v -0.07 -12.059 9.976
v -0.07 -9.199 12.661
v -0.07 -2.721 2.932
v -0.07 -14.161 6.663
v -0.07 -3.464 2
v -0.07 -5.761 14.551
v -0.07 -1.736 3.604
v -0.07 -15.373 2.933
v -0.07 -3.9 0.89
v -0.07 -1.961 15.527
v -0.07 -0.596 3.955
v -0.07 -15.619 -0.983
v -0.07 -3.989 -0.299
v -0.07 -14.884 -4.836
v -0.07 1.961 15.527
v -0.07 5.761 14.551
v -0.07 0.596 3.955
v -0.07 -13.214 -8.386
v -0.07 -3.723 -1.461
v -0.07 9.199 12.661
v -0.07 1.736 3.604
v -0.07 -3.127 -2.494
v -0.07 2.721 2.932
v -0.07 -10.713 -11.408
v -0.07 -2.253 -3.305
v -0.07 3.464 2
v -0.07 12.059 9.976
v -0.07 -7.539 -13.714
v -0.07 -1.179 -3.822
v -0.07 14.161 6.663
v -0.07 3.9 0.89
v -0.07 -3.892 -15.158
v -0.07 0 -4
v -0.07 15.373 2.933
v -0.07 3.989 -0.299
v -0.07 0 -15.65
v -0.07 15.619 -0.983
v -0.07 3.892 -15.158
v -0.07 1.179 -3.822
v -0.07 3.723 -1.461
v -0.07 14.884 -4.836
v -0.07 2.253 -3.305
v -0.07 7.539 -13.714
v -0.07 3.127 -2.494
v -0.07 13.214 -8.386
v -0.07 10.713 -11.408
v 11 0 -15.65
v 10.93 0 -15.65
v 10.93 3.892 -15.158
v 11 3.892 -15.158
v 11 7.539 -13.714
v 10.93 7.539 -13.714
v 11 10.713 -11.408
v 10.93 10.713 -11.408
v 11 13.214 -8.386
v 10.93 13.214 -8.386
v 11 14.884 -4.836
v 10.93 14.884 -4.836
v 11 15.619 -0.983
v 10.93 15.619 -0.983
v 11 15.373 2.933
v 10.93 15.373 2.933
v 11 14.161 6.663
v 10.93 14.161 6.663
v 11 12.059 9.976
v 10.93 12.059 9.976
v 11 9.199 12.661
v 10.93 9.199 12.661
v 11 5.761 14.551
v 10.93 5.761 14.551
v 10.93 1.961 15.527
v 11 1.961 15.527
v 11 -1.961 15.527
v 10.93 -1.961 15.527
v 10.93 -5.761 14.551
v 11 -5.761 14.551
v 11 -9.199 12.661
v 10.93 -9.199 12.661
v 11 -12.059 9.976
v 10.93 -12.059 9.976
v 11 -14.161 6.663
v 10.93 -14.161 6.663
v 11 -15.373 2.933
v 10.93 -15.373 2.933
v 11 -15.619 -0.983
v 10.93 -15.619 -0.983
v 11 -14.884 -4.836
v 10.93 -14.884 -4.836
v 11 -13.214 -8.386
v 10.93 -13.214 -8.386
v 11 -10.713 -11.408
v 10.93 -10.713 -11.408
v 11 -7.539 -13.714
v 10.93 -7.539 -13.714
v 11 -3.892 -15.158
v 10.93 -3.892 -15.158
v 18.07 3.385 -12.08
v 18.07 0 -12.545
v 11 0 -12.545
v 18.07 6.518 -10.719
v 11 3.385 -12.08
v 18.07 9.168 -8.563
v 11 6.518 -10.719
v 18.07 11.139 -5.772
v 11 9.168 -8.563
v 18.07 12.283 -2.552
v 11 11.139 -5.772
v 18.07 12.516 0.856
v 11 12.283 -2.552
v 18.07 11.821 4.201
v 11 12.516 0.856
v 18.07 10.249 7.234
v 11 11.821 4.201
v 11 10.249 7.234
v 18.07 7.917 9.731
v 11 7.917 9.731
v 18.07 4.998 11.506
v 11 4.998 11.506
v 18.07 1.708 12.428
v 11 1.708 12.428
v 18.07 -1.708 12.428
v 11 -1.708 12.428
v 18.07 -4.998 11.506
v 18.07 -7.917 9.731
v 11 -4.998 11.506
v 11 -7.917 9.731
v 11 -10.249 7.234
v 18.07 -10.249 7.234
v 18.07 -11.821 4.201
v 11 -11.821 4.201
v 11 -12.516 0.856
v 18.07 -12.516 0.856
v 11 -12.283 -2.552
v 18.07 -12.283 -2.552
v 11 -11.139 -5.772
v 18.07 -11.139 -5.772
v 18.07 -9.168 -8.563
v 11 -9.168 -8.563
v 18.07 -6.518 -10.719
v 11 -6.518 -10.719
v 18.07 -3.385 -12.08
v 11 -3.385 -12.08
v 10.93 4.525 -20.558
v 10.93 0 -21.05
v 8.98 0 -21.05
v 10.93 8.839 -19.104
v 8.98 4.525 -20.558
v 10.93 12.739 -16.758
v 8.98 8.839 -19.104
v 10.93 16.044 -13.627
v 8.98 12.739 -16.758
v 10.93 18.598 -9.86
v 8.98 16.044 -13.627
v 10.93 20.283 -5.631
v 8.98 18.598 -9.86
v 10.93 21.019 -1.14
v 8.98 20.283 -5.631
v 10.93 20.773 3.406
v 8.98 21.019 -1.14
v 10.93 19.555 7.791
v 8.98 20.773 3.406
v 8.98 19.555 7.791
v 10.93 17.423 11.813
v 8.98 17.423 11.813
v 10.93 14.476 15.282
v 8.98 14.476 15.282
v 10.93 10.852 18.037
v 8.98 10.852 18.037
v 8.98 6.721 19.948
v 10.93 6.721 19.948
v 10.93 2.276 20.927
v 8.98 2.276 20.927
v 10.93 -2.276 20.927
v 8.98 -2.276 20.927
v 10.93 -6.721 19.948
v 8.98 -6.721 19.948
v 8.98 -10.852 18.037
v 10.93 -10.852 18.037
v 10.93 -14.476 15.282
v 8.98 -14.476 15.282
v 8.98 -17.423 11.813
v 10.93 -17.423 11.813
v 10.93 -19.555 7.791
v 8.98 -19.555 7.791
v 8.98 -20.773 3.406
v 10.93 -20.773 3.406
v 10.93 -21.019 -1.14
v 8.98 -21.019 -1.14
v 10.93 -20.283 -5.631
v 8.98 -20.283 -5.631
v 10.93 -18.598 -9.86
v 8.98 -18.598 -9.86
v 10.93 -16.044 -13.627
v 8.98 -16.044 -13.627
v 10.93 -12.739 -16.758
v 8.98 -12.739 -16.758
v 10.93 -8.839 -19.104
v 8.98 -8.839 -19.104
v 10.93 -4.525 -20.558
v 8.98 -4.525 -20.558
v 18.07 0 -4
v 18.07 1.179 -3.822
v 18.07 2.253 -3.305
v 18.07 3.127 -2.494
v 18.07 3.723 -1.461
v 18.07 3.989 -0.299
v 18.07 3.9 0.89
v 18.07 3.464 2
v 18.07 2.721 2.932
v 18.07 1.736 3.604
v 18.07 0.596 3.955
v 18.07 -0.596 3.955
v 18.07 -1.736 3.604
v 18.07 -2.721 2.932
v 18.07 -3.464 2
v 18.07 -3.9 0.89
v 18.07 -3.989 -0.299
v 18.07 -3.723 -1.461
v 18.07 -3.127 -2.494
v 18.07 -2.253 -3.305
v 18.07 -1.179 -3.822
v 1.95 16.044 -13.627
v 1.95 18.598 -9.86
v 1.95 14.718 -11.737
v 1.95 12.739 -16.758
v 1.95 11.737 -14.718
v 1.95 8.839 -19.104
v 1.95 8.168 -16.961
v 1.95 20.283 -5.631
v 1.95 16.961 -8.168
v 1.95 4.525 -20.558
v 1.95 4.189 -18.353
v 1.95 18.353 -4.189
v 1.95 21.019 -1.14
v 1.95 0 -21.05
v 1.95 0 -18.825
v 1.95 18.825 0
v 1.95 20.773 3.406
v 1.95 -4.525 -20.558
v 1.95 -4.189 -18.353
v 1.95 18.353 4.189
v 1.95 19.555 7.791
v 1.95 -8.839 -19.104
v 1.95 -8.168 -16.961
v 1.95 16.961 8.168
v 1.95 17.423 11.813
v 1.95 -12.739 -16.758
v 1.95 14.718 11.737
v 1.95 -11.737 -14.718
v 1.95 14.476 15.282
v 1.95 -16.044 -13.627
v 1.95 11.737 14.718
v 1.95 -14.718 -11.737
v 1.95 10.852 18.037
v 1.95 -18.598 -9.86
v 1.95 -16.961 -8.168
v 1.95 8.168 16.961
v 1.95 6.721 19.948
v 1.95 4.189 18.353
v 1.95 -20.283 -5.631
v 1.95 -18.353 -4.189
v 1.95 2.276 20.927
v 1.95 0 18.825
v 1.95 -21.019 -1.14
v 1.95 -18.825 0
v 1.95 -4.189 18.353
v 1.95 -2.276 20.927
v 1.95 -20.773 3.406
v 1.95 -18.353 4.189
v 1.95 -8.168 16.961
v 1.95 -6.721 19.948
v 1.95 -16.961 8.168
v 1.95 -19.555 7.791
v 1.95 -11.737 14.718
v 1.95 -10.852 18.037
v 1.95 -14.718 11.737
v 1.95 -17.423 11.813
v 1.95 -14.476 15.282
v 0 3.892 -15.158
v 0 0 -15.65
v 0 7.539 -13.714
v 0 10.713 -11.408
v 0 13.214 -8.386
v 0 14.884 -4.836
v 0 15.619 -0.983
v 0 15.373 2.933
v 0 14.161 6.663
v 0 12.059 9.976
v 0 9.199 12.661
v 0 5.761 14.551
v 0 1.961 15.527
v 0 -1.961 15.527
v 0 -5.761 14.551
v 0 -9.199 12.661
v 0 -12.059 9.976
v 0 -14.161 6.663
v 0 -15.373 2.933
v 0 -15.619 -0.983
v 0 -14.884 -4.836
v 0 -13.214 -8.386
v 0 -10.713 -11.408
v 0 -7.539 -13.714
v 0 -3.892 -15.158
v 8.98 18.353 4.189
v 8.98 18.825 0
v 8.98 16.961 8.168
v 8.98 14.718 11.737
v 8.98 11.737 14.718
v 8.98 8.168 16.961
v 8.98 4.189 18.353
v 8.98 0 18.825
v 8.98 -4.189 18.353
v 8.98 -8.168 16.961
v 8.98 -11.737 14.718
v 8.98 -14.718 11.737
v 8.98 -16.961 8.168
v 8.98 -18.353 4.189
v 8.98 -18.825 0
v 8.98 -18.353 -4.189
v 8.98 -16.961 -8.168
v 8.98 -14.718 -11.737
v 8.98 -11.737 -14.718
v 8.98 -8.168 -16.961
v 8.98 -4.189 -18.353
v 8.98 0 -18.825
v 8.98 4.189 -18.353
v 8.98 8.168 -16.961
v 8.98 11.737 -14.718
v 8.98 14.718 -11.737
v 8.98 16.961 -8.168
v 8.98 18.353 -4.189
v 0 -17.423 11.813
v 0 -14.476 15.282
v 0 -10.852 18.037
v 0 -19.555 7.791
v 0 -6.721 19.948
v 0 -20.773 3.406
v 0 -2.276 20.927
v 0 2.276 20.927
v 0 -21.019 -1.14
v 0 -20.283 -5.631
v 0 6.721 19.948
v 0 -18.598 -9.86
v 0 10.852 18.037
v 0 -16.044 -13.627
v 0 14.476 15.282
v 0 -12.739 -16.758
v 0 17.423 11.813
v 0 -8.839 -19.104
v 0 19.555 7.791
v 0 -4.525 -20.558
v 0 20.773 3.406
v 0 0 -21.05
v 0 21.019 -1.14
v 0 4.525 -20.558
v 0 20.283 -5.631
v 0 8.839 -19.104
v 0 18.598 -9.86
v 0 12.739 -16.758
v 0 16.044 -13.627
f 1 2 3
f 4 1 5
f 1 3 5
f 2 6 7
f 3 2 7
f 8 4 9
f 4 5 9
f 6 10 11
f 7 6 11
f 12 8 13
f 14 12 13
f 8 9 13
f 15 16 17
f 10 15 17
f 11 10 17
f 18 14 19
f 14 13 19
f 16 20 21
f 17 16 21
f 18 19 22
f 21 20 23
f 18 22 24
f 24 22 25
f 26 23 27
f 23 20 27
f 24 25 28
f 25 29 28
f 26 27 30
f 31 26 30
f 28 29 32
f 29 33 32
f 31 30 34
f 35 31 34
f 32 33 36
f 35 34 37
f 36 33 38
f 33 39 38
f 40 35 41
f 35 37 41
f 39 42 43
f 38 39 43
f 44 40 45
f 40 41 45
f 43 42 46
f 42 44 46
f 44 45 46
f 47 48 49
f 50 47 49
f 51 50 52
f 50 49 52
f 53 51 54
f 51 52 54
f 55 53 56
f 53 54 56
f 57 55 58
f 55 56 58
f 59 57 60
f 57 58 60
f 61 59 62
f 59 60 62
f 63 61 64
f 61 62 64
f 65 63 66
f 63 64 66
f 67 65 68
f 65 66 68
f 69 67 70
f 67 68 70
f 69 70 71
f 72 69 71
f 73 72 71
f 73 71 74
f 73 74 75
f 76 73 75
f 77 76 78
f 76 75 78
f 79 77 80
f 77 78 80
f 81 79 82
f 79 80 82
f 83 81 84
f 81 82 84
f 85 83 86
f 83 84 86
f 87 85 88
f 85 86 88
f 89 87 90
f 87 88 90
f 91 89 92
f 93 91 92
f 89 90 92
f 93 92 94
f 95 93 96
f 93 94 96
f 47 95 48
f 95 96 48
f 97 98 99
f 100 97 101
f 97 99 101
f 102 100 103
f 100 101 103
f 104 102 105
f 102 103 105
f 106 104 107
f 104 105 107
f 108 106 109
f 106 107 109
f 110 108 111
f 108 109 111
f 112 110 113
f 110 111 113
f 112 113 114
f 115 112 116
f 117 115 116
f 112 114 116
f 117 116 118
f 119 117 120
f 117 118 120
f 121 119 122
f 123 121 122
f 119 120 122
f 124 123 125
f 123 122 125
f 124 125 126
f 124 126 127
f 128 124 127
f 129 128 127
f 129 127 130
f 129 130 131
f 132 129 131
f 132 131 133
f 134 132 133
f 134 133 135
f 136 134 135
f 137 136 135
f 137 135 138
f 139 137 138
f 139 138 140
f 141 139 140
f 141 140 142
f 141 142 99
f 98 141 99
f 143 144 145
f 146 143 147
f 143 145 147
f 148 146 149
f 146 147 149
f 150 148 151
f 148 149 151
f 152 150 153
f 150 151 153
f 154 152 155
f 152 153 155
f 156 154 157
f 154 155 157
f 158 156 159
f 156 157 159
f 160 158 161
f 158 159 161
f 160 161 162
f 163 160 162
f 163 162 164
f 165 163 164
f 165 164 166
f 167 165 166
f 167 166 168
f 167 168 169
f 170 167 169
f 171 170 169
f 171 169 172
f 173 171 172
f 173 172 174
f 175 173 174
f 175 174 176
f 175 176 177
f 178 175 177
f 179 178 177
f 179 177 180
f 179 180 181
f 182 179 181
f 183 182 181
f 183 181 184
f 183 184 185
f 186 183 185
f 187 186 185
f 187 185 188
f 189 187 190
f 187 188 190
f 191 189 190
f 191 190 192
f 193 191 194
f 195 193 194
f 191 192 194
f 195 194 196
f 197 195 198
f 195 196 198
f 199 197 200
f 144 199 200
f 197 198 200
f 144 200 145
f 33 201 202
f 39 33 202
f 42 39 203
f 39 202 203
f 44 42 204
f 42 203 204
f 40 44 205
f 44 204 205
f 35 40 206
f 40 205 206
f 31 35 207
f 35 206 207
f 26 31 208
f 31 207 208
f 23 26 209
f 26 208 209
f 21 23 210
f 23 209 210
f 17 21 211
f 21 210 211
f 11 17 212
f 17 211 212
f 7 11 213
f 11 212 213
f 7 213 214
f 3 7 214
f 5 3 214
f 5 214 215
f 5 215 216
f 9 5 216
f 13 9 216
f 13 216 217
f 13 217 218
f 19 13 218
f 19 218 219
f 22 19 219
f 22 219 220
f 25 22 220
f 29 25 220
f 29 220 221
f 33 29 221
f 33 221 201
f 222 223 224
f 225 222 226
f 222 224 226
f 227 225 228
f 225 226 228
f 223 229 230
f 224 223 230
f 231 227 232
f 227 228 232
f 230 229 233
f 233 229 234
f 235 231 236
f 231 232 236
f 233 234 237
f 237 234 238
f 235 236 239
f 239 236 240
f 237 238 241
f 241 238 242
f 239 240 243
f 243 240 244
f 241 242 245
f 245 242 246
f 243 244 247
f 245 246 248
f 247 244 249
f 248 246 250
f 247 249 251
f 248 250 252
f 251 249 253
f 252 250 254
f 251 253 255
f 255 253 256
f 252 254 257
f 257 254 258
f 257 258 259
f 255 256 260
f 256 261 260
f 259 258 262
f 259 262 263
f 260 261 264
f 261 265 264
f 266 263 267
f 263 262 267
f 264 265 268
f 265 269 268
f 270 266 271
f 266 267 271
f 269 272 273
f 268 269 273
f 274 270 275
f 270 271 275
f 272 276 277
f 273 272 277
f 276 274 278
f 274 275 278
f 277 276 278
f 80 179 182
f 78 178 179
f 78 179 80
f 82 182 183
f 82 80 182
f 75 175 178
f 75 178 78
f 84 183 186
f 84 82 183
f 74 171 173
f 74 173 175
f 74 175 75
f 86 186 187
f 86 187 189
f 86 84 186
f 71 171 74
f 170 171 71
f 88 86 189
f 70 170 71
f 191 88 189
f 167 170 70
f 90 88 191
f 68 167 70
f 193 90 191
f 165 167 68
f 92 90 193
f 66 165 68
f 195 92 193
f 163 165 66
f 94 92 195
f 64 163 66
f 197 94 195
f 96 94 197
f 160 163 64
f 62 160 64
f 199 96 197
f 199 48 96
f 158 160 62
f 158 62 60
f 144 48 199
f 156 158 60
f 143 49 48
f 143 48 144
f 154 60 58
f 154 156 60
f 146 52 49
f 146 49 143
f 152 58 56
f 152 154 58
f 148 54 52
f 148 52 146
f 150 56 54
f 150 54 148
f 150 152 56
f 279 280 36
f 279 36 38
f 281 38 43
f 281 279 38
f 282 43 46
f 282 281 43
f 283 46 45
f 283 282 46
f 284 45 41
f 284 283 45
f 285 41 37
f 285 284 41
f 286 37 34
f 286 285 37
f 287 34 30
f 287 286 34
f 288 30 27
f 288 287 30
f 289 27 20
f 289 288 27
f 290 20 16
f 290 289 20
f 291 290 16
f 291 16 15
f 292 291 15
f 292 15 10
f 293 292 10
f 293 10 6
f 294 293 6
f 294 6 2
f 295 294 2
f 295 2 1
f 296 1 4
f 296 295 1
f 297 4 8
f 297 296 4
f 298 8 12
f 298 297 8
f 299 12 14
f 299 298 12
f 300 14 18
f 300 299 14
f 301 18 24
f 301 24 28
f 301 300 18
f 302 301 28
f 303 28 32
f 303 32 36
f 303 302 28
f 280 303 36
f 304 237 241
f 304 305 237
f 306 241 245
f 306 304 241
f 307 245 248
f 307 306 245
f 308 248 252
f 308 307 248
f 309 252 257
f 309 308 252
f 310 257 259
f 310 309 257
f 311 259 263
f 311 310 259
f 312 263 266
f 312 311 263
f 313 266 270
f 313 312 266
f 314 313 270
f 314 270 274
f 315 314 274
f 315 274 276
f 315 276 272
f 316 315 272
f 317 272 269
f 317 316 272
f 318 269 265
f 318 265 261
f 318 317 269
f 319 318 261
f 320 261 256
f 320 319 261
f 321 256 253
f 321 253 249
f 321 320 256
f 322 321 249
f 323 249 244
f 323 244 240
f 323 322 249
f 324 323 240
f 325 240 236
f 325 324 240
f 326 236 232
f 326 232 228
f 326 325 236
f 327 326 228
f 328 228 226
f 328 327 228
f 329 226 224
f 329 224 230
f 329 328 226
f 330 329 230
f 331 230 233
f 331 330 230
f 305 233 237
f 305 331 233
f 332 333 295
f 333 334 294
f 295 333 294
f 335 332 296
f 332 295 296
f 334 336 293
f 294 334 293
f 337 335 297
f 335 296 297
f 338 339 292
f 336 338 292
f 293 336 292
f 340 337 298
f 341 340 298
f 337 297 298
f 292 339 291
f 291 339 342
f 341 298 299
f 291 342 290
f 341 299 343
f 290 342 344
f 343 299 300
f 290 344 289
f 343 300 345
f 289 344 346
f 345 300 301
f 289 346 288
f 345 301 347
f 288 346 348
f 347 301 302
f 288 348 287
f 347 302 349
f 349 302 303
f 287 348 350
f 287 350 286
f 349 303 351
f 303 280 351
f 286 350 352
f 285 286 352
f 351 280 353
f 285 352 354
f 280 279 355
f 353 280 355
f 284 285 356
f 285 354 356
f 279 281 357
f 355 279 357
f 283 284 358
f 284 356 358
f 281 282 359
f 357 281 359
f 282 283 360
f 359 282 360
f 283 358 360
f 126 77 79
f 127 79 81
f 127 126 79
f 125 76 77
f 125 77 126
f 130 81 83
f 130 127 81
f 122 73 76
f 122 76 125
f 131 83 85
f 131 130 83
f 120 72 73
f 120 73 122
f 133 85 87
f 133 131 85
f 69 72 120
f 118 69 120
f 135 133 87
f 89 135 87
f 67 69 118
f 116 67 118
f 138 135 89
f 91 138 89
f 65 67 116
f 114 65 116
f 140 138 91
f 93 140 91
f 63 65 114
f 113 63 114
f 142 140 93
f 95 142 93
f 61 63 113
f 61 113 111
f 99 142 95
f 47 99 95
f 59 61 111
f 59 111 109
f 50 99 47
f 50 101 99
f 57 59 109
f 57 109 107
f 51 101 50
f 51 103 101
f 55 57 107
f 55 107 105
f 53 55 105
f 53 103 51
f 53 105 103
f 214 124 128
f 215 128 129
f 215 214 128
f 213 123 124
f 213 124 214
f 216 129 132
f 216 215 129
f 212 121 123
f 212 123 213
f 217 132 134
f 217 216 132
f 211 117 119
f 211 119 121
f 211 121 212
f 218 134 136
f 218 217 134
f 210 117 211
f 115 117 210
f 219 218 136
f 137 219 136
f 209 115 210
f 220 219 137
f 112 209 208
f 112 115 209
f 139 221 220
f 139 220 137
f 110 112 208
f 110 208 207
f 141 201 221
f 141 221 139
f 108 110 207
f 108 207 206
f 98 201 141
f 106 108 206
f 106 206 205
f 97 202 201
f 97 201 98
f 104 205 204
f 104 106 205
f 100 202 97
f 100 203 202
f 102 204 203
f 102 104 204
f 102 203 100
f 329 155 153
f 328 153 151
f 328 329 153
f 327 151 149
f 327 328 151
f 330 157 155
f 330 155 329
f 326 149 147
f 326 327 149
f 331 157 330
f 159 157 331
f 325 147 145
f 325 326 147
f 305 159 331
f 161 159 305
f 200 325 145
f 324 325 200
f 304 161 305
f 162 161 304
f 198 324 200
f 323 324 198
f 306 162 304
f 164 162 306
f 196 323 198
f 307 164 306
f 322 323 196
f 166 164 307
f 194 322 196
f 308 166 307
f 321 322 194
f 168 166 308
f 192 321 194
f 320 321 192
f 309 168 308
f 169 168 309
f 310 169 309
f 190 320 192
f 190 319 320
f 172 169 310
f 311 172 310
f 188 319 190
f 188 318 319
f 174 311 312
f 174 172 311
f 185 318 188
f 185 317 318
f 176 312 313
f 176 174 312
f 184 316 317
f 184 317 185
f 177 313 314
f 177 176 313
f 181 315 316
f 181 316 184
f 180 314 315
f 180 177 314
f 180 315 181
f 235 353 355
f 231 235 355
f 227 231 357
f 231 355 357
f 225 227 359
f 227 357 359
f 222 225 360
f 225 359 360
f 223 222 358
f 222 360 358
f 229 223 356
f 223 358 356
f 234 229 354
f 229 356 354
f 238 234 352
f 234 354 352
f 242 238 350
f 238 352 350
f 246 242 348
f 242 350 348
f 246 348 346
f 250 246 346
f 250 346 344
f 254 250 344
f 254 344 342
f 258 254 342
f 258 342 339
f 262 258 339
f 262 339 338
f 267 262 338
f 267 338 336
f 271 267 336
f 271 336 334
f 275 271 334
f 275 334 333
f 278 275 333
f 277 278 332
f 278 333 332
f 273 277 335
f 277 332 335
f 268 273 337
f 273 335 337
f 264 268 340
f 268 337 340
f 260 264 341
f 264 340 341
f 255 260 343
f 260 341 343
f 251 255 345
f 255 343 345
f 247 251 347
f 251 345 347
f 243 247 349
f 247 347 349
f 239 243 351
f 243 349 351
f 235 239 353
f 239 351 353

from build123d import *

# Parameters (mm, degrees)
SKETCH1_R           = 21.05
BOSS_EXTRUDE1_DEPTH = 10.93
SKETCH2_R           = 15.65
BOSS_EXTRUDE2_DEPTH = 0.07
SKETCH3_W           = 7.03
SKETCH3_H           = 2.225
SKETCH5_R           = 12.545
BOSS_EXTRUDE3_DEPTH = 7.14
SKETCH6_R           = 4
CUT_EXTRUDE1_DEPTH  = 19.14


with BuildPart() as part:
    # Sketch1 → Boss-Extrude1 (new body)
    with BuildSketch(Plane(origin=(0, 0, 0), x_dir=(0, 0, -1), z_dir=(1, 0, 0))):
        Circle(SKETCH1_R)
    extrude(amount=BOSS_EXTRUDE1_DEPTH)

    # Sketch2 → Boss-Extrude2 (add)
    with BuildSketch(Plane(origin=(10.93, 0, 0), x_dir=(0, 0, -1), z_dir=(1, 0, 0))):
        Circle(SKETCH2_R)
    extrude(amount=BOSS_EXTRUDE2_DEPTH)

    # Mirror1: part across plane


with BuildPart() as part_1:
    add(part.part)
    add(part.part.mirror(Plane(origin=(5.465, 0, 0), x_dir=(0, 0, 1), z_dir=(1, 0, 0))))

    # Sketch3 → Cut-Revolve1 (revolve, cut)
    with BuildSketch(Plane.XY):
        with Locations((5.465, 19.9375)):
            Rectangle(SKETCH3_W, SKETCH3_H)
    revolve(axis=Axis((0, 0, 0), (1, 0, 0)), mode=Mode.SUBTRACT)

    # Sketch5 → Boss-Extrude3 (add)
    with BuildSketch(Plane(origin=(10.93, 0, 0), x_dir=(0, 0, -1), z_dir=(1, 0, 0))):
        Circle(SKETCH5_R)
    extrude(amount=BOSS_EXTRUDE3_DEPTH)

    # Sketch6 → Cut-Extrude1 (cut, through all)
    with BuildSketch(Plane(origin=(18.07, 0, 0), x_dir=(0, 0, -1), z_dir=(1, 0, 0))):
        Circle(SKETCH6_R)
    extrude(amount=-CUT_EXTRUDE1_DEPTH, mode=Mode.SUBTRACT)


solid = part_1.part
